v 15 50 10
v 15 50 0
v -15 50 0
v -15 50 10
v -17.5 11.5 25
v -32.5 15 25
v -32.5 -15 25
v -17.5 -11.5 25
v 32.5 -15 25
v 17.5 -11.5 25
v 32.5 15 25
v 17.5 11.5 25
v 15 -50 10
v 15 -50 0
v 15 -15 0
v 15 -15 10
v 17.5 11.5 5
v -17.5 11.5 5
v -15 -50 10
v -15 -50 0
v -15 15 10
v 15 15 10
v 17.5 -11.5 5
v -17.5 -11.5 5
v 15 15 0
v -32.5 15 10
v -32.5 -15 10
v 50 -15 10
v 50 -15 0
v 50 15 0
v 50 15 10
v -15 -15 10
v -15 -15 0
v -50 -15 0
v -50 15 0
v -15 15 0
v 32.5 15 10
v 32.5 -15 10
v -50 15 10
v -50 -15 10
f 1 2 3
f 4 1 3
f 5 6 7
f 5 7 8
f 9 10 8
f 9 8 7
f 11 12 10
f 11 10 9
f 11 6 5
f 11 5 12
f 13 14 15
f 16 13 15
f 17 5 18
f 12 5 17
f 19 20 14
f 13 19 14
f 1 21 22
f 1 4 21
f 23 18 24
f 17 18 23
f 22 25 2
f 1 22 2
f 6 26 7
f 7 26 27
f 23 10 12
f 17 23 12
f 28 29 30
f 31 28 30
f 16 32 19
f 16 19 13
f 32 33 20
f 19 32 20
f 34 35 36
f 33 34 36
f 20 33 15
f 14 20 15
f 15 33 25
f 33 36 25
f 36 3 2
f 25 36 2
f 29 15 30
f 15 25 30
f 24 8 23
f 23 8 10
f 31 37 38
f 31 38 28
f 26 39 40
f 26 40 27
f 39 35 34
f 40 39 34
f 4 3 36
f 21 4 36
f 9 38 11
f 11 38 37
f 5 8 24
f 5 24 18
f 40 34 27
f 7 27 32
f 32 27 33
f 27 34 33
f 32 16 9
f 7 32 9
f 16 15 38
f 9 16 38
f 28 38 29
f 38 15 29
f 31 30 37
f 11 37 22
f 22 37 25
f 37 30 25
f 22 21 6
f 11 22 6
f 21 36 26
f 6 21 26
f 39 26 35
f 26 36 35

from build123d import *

# Parameters (mm, degrees)
F1_DEPTH = 10
F3_DEPTH = 15
F4_W     = 35
F4_H     = 23
F5_DEPTH = 20


with BuildPart() as f1:
    # F0 (on Top) → F1 (new body)
    with BuildSketch(Plane.XY):
        Polygon((15, 15), (15, 50), (-15, 50), (-15, 15), (-50, 15), (-50, -15), (-15, -15), (-15, -50), (15, -50), (15, -15), (50, -15), (50, 15), align=None)
    extrude(amount=F1_DEPTH)

    # F2 (on face) → F3 (join)
    with BuildSketch(Plane.XY.offset(10)):
        Polygon((32.5, 15), (15, 15), (-15, 15), (-32.5, 15), (-32.5, -15), (-15, -15), (15, -15), (32.5, -15), align=None)
    extrude(amount=F3_DEPTH)

    # F4 (on face) → F5 (cut)
    with BuildSketch(Plane.XY.offset(25)):
        Rectangle(F4_W, F4_H)
    extrude(amount=-F5_DEPTH, mode=Mode.SUBTRACT)


solid = f1.part
